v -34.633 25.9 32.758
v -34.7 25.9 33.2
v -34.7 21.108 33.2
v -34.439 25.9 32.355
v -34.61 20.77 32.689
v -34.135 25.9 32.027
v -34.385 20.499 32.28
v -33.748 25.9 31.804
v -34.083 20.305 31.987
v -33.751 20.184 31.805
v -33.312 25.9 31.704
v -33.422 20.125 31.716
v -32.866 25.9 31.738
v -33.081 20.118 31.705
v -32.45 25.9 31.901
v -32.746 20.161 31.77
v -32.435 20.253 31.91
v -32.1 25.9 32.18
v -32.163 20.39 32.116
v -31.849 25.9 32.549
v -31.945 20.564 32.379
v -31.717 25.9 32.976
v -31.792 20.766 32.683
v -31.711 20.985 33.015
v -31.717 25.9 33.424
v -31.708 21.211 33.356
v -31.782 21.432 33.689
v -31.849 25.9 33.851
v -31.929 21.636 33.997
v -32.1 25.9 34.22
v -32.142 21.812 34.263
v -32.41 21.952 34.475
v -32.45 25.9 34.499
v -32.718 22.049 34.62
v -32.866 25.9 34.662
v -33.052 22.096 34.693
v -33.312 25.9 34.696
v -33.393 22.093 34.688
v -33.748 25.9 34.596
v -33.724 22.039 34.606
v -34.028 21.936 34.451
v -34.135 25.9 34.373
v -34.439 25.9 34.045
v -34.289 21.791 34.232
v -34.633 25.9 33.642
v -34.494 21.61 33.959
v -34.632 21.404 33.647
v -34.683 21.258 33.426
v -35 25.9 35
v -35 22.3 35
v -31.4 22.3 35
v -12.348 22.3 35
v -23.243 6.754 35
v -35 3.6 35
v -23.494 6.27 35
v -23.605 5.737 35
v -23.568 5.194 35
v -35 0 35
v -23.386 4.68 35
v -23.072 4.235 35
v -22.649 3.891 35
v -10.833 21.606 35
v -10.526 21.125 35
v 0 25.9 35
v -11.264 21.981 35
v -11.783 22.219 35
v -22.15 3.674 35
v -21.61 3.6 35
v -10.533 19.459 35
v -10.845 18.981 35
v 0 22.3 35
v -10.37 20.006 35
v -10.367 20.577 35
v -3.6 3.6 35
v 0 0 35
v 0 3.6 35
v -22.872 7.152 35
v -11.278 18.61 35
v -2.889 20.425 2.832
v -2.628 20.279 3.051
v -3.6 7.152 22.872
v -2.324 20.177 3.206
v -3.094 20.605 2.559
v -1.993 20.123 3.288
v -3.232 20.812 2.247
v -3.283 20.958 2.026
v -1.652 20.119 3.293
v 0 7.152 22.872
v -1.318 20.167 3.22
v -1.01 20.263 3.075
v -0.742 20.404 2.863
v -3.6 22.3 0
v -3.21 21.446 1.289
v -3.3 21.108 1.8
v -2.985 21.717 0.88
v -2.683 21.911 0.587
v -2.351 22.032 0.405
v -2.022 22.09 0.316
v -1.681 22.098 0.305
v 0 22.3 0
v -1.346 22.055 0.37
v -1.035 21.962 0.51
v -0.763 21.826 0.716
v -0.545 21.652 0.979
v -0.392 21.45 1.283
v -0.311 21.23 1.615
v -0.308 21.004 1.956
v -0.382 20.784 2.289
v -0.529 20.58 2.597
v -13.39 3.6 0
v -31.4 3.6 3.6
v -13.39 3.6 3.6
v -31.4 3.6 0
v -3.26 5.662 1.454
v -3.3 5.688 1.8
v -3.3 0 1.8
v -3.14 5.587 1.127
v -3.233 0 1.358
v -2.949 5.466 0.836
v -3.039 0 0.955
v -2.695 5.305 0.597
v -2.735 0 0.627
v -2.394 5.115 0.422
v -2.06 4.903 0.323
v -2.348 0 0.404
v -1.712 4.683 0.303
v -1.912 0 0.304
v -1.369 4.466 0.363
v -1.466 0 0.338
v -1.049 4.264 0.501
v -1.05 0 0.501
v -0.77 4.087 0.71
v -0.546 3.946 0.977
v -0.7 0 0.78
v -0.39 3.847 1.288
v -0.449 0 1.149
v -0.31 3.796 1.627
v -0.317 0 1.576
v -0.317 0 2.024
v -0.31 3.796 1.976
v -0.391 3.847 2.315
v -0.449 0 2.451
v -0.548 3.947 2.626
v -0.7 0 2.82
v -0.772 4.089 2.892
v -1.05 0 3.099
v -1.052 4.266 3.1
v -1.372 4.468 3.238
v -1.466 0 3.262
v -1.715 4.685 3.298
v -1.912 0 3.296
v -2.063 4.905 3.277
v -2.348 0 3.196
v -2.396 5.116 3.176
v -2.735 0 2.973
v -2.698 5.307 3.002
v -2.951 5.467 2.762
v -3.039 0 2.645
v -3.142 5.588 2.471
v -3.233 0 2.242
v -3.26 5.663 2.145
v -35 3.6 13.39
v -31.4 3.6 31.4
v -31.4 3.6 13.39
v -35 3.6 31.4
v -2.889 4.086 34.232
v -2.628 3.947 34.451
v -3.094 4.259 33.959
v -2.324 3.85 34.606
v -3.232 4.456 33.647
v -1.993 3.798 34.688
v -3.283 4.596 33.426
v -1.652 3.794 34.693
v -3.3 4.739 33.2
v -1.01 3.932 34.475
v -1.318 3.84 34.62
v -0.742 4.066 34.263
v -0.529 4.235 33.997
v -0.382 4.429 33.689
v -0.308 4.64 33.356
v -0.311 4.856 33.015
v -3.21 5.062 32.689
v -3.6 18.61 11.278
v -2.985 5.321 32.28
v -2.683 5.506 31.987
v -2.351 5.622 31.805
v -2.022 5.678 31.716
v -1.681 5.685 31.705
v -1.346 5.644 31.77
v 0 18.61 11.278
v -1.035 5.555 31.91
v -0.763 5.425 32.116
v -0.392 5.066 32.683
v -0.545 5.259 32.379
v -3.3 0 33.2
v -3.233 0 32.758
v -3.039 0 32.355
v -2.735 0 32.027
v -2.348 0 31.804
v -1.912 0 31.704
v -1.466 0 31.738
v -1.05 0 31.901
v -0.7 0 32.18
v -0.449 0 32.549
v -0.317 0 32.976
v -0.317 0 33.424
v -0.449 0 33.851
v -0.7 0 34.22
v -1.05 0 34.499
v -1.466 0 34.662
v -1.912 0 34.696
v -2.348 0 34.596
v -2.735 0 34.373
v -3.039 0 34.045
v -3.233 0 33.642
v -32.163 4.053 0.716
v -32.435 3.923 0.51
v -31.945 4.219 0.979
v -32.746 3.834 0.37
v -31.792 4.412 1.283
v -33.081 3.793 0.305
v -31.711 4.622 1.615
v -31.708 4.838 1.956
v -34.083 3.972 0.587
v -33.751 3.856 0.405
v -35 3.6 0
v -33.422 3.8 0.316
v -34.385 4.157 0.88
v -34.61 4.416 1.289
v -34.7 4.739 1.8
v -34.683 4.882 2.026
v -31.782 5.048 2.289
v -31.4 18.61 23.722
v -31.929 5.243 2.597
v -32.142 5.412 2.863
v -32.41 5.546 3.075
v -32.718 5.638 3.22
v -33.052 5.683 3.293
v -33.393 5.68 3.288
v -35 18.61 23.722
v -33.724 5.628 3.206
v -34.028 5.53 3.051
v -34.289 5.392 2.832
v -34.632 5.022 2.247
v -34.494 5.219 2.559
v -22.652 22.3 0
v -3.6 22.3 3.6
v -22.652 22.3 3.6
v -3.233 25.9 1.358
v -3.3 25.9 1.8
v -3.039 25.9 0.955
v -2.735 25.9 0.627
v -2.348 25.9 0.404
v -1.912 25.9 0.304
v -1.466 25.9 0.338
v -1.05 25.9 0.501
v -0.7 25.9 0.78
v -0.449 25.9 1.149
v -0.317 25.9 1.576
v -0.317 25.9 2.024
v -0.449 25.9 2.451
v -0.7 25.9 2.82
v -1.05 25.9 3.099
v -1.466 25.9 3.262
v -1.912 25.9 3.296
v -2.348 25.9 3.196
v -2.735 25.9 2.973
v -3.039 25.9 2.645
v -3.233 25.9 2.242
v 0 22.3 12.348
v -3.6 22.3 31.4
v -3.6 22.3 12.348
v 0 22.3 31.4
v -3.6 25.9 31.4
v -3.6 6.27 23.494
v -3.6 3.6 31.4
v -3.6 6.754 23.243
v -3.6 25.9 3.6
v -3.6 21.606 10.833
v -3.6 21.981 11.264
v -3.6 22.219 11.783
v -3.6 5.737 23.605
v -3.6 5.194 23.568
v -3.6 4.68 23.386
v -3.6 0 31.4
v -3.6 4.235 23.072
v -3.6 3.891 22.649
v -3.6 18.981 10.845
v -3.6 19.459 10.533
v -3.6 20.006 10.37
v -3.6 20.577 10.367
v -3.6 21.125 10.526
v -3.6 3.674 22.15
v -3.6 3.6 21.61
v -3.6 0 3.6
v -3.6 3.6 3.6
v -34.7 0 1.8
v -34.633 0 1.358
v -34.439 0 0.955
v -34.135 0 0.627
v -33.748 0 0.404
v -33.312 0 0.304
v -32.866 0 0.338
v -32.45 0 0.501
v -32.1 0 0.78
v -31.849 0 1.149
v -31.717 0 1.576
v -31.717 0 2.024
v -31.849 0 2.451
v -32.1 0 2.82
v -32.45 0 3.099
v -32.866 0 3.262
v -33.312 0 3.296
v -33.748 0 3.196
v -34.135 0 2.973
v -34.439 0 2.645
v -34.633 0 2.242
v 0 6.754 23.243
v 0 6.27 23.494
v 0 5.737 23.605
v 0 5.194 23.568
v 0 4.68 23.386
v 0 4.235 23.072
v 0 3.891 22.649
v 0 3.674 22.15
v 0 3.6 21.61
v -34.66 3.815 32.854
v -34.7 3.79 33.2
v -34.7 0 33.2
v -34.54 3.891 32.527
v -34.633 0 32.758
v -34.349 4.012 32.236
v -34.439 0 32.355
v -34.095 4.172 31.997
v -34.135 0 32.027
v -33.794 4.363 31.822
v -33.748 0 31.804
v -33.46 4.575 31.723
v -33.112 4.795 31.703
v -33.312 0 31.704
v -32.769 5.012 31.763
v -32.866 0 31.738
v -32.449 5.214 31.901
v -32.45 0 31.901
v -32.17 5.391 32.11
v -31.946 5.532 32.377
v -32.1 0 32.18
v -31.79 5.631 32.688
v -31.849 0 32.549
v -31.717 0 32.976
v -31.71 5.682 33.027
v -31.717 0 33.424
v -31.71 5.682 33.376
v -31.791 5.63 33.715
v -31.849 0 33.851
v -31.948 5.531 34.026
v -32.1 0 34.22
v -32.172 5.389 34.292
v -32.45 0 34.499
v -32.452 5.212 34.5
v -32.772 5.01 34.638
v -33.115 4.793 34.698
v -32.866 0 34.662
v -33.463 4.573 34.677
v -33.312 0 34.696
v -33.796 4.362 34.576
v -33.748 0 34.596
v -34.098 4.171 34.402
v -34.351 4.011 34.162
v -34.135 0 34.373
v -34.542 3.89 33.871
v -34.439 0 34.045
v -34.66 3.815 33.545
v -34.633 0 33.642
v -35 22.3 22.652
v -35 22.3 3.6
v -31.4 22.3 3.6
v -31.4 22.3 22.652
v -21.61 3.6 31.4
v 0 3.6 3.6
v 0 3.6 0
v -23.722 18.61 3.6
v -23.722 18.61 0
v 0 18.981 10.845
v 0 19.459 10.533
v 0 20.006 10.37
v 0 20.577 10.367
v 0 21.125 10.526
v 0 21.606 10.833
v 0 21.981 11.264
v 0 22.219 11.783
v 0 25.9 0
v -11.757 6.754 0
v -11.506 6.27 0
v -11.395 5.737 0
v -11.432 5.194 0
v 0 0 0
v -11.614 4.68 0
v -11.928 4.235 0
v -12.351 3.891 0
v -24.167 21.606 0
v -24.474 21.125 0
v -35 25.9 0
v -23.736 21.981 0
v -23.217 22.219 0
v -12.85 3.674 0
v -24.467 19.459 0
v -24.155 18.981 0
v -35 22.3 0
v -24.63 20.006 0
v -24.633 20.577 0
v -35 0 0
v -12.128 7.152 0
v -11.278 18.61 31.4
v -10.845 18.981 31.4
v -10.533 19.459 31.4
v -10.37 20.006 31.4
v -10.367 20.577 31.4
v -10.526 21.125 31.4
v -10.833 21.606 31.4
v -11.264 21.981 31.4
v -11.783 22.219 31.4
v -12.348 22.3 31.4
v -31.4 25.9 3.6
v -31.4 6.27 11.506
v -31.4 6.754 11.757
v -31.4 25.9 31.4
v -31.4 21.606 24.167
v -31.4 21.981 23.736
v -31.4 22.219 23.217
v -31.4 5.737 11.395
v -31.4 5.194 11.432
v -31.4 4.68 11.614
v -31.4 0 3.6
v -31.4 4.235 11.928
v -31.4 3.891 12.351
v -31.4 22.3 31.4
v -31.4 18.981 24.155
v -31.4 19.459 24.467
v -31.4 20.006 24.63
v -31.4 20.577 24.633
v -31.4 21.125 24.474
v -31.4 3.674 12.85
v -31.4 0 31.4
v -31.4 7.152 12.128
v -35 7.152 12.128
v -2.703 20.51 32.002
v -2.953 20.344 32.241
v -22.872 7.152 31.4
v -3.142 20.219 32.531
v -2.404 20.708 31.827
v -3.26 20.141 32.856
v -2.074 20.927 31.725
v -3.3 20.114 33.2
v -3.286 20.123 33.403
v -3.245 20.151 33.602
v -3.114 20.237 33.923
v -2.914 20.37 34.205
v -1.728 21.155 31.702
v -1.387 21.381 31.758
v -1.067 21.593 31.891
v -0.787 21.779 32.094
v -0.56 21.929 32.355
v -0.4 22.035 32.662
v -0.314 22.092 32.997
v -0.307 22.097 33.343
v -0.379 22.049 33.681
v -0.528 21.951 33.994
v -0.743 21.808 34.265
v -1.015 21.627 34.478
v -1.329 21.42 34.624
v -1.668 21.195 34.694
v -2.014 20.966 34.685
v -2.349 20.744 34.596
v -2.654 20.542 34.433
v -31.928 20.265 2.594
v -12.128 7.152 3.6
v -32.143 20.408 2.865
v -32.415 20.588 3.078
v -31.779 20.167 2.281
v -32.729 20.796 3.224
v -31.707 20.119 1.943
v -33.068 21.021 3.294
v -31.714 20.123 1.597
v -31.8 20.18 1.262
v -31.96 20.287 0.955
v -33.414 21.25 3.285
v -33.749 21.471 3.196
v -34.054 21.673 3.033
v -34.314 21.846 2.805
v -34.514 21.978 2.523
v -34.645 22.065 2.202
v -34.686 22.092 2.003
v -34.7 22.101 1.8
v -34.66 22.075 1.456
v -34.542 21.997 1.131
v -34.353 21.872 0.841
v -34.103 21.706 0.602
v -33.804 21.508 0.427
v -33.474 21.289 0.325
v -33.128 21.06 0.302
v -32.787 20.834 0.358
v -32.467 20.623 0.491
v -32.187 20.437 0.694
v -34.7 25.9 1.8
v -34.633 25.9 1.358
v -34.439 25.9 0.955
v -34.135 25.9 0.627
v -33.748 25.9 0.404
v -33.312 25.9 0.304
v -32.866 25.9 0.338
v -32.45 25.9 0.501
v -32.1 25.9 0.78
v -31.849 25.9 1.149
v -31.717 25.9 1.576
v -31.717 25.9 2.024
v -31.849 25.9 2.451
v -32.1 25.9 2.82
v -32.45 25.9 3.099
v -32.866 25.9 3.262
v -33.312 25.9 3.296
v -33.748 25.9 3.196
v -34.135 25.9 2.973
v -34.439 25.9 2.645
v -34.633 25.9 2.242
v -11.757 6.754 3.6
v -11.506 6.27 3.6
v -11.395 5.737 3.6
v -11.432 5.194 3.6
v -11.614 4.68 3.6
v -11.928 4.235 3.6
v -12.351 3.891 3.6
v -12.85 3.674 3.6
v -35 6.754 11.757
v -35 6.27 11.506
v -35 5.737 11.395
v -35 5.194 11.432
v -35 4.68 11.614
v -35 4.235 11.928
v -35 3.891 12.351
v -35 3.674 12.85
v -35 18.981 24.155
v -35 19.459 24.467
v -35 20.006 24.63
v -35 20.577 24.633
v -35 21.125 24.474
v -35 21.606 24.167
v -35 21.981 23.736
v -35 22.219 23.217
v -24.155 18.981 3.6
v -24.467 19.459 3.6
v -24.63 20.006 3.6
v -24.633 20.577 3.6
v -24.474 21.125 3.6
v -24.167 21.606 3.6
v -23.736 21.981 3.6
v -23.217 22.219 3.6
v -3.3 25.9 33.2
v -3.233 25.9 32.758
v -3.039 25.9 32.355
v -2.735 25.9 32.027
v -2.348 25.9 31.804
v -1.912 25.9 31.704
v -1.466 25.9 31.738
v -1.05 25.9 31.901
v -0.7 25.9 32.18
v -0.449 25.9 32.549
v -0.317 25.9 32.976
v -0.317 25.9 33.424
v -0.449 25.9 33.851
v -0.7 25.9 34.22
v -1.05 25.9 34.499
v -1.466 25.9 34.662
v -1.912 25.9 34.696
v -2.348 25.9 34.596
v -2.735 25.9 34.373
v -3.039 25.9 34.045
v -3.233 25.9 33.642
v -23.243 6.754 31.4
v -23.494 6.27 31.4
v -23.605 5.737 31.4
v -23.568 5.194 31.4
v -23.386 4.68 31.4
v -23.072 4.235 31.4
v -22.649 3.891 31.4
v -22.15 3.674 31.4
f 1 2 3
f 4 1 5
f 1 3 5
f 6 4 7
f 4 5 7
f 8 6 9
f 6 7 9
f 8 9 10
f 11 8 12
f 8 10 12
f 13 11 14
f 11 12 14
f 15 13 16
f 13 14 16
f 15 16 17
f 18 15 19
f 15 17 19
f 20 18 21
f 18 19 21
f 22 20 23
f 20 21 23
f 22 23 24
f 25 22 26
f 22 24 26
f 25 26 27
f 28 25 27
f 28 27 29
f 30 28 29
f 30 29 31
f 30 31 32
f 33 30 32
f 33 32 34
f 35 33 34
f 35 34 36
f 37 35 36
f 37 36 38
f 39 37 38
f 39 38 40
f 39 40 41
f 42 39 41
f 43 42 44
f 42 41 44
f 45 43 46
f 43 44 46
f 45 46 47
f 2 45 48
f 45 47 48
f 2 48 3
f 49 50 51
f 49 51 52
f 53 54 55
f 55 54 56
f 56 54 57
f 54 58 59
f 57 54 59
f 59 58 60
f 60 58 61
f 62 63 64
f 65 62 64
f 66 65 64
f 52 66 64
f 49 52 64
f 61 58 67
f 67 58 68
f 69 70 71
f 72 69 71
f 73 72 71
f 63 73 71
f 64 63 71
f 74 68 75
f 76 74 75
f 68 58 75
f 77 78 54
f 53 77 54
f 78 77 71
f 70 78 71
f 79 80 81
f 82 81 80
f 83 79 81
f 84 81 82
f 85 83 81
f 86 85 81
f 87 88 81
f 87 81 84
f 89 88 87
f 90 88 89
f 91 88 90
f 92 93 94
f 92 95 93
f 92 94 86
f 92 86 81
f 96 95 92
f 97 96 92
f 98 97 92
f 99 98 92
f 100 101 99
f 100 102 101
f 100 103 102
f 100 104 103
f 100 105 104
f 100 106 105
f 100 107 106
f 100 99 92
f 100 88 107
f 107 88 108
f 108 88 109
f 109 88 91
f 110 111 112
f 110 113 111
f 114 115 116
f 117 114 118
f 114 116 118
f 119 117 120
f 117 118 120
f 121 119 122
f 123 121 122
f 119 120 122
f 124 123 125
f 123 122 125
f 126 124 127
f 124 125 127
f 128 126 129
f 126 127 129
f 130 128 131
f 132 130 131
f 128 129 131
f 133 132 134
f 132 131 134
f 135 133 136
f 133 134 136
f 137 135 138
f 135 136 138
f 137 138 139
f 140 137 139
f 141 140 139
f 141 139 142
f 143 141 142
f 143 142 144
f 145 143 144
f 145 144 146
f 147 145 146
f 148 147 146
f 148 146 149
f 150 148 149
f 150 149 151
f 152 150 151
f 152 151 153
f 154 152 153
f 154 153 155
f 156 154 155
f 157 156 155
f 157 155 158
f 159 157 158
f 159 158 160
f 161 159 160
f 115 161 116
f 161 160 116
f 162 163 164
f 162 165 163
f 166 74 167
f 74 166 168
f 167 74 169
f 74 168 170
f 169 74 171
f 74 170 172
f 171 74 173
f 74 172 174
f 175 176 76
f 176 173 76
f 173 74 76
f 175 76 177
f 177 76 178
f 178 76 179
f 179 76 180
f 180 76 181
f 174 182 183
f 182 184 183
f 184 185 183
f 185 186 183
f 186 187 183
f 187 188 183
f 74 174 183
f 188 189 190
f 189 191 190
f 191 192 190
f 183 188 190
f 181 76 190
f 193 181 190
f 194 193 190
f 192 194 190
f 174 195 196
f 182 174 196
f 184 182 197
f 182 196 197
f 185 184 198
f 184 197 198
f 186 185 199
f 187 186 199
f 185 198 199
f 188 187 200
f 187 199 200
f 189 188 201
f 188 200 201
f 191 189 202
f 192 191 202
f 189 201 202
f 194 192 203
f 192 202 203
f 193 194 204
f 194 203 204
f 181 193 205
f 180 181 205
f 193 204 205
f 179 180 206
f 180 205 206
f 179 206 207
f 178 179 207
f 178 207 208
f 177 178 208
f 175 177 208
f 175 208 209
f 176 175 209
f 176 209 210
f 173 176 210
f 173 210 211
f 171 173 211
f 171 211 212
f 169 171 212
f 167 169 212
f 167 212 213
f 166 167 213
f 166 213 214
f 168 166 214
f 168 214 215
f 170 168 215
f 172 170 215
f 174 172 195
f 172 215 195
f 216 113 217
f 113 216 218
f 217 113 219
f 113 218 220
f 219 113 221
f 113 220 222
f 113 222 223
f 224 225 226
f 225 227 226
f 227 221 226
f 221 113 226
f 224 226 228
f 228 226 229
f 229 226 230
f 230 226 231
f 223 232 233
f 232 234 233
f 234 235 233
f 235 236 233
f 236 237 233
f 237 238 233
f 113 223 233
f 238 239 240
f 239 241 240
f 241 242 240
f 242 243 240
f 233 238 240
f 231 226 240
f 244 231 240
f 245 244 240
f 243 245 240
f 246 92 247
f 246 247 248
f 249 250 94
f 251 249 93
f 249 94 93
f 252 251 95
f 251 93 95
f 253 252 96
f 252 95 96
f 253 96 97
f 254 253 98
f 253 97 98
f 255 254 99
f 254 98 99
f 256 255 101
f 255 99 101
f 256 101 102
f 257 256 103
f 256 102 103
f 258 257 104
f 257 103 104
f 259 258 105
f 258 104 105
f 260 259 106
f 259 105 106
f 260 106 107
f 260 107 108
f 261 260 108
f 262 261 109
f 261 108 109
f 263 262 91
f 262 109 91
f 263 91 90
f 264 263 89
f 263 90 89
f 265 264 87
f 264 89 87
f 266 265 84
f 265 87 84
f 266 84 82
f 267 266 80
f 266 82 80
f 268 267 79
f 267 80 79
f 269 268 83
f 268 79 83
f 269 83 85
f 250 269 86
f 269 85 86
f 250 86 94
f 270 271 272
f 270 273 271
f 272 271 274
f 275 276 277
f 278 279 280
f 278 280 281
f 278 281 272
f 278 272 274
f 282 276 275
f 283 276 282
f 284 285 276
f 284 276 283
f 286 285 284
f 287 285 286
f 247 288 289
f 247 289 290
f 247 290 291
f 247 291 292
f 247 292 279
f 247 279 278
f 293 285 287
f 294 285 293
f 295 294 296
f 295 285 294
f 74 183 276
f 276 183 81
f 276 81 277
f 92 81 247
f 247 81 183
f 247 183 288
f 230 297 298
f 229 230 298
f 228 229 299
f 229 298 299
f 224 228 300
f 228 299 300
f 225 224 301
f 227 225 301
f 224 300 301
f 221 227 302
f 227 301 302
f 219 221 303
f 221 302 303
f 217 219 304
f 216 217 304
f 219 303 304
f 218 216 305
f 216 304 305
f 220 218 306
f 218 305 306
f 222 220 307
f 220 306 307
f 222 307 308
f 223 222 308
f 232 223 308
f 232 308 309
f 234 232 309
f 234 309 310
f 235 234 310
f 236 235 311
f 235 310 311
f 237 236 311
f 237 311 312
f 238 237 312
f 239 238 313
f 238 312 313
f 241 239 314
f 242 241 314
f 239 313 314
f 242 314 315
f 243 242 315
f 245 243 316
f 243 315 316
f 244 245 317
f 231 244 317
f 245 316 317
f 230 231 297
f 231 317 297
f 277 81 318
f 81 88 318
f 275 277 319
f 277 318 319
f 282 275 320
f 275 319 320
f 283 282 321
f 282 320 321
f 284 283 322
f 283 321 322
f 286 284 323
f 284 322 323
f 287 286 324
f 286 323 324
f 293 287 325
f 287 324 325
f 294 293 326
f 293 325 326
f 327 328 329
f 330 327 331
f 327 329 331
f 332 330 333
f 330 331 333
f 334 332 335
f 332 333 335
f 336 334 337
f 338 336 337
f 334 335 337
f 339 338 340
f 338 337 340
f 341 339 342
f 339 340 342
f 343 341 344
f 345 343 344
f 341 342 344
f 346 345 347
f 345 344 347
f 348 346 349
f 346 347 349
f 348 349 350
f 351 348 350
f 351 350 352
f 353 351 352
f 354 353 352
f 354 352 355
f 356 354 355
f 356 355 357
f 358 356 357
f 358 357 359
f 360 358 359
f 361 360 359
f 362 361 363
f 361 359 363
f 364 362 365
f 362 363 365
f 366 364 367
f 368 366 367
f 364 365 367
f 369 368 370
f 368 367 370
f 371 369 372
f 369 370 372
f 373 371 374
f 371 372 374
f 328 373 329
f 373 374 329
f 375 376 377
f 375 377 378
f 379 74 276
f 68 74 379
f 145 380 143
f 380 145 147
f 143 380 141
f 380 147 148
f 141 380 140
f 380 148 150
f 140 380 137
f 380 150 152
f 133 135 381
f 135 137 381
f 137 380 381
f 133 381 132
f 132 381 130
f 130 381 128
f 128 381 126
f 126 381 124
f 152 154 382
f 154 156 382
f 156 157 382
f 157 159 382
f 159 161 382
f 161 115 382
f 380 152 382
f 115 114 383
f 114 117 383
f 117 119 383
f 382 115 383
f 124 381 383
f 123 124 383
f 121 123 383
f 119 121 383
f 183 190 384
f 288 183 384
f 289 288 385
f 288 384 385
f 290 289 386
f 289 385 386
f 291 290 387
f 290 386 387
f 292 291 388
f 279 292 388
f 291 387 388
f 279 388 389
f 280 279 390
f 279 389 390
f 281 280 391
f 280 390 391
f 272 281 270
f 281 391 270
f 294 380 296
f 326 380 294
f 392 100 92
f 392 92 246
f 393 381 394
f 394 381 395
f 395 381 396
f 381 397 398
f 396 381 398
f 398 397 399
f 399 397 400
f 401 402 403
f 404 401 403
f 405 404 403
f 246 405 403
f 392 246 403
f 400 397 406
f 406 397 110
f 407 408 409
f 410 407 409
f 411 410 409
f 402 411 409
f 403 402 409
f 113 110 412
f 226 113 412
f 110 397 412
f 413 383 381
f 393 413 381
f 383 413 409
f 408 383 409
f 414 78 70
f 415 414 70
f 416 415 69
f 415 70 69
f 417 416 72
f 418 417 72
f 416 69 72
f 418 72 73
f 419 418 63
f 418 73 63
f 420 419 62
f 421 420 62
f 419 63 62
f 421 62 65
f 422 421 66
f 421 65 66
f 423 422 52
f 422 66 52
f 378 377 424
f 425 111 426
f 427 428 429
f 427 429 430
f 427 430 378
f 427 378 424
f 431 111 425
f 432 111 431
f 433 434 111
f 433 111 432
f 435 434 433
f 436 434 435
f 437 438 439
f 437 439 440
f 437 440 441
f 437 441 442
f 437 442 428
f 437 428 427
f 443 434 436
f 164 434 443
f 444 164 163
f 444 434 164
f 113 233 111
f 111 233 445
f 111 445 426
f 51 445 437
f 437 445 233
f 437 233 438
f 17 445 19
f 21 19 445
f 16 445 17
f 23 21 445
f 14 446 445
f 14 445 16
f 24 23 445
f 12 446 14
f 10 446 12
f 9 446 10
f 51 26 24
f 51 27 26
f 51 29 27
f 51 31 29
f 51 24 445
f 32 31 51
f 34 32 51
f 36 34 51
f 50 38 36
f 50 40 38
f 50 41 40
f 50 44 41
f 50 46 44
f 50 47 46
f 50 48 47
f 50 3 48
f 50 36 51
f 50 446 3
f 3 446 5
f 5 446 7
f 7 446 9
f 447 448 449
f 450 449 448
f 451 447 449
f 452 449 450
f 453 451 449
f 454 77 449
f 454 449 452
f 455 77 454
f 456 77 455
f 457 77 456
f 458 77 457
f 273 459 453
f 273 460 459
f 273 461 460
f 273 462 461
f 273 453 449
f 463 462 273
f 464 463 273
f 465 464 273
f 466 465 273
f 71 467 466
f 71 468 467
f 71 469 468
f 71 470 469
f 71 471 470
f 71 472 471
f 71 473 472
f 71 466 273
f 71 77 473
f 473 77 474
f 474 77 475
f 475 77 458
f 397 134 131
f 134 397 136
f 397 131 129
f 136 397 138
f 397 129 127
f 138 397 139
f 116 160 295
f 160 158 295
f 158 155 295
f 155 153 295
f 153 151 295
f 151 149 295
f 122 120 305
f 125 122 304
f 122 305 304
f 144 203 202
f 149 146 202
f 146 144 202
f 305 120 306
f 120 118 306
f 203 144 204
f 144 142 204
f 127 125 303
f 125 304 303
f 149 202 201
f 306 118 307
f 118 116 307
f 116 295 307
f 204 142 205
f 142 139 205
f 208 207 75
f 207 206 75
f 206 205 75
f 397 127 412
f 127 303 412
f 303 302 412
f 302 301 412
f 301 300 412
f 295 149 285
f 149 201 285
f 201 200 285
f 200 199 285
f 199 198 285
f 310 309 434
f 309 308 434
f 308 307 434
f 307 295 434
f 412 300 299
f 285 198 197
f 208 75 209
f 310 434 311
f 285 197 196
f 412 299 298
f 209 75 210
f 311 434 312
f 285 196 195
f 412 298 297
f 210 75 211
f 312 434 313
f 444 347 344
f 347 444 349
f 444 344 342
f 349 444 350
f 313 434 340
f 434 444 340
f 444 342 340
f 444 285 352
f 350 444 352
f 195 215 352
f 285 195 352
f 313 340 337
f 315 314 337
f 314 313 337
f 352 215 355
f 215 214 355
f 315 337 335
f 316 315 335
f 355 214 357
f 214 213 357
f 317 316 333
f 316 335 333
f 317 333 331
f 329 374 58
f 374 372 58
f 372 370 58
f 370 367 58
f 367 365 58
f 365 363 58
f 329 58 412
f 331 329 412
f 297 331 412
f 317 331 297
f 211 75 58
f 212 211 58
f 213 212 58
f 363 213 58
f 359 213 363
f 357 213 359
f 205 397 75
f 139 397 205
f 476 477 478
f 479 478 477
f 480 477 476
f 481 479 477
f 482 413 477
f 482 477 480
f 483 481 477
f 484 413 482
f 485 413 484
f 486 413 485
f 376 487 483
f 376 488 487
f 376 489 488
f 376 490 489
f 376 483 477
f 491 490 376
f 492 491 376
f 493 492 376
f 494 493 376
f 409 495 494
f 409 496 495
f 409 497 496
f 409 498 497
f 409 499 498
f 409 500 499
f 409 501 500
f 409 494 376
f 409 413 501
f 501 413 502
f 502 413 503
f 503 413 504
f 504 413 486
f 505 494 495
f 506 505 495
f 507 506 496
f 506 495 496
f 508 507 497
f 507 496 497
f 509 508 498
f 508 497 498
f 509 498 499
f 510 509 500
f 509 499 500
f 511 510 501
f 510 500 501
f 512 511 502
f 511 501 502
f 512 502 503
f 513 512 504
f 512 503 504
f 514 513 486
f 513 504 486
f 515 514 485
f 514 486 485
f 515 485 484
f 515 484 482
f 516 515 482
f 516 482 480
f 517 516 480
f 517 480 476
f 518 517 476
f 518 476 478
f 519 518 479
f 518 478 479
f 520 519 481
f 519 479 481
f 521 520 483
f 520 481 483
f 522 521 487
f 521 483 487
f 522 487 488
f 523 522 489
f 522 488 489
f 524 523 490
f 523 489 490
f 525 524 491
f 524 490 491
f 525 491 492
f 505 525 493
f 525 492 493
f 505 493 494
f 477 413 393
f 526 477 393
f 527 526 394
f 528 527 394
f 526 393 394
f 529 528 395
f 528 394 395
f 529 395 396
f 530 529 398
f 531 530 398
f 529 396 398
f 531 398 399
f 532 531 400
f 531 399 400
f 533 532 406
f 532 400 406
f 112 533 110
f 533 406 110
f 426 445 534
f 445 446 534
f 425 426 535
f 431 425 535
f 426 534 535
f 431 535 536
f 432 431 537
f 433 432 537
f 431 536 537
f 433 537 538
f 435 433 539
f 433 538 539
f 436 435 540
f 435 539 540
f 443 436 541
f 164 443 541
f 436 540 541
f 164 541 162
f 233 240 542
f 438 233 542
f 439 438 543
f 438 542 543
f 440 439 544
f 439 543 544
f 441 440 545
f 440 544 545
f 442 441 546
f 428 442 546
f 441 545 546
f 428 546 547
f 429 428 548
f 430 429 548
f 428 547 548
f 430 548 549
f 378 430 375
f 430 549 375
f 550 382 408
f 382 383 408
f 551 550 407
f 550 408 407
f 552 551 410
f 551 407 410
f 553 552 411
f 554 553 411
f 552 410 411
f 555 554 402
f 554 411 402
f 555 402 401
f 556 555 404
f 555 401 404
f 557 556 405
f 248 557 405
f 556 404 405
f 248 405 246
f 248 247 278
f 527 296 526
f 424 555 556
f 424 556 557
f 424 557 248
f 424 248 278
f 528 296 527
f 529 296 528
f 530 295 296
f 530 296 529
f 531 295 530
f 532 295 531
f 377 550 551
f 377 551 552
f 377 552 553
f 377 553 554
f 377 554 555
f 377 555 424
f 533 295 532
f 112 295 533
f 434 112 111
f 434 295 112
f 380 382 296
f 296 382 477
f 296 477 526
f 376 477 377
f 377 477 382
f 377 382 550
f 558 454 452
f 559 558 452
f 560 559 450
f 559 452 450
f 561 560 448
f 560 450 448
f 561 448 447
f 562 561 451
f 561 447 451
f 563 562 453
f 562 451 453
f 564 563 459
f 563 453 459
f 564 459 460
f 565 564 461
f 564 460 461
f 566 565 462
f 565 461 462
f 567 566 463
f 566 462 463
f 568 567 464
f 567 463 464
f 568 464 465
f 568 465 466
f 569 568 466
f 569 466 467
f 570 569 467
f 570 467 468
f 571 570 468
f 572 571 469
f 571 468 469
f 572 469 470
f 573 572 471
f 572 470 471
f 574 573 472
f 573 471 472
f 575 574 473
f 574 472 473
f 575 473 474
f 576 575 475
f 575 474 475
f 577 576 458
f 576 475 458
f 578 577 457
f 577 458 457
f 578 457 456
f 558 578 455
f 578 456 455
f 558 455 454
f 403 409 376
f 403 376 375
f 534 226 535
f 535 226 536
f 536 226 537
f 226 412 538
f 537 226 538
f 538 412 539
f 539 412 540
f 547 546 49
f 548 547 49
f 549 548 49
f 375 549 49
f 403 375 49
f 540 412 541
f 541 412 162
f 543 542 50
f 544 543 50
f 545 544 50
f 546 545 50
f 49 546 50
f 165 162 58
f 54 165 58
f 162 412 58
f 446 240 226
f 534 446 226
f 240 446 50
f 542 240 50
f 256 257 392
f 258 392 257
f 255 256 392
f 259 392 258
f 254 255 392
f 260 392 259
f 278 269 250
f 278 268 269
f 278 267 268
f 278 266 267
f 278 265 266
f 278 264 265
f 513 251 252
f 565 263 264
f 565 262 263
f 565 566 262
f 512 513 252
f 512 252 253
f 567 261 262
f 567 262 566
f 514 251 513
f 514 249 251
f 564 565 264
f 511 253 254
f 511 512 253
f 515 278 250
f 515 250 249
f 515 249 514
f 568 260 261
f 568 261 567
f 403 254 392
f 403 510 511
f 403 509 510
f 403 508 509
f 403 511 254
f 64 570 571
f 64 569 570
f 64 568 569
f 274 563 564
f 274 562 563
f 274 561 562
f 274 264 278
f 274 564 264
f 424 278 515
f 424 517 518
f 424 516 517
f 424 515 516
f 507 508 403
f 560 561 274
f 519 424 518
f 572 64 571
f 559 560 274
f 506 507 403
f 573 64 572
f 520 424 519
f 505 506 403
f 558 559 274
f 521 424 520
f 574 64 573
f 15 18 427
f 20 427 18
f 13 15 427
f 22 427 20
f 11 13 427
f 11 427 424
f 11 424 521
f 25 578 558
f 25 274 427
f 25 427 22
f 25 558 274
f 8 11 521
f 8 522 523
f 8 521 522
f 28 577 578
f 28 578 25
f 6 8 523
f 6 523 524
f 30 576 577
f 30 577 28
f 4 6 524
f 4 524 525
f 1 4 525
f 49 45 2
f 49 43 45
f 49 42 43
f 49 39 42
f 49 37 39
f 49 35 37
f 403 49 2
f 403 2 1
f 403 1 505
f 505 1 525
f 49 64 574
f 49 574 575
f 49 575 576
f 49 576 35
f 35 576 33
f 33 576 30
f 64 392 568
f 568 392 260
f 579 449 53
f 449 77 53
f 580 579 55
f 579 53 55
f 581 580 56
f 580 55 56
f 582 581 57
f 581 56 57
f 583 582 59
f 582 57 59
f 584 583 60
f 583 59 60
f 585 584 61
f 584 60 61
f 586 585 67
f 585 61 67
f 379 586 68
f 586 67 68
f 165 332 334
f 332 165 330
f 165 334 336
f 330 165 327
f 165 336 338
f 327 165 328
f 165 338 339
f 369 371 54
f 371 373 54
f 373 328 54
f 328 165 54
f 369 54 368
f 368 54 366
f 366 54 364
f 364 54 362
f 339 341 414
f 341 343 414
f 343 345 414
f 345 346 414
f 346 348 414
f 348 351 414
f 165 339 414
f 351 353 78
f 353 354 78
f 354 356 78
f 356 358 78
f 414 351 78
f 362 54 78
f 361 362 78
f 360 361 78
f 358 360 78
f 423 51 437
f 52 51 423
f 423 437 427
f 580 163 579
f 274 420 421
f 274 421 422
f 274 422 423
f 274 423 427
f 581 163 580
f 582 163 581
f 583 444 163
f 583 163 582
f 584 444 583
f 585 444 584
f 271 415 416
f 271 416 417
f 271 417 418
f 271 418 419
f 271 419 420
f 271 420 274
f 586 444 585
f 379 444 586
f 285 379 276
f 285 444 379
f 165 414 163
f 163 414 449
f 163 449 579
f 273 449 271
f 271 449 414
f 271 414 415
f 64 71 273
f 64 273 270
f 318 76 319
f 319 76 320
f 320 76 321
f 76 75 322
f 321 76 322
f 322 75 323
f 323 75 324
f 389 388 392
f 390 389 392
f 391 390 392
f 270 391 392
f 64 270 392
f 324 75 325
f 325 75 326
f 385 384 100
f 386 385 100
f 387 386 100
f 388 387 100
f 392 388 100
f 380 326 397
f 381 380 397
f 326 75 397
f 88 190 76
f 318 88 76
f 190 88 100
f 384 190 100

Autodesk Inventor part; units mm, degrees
ref_plane "YZ Plane" through (0, 0, 0) normal (1, 0, 0) x (0, 1, 0)
ref_plane "XZ Plane" through (0, 0, 0) normal (0, 1, 0) x (-1, 0, 0)
ref_plane "XY Plane" through (0, 0, 0) normal (0, 0, 1) x (1, 0, 0)
sketch "Sketch1" plane through (0, 0, 0) normal (0, 1, 0) x (-1, 0, 0)
  line L0 (0, 0) -> (35, 0)
  line L1 (35, 0) -> (35, 35)
  line L2 (35, 35) -> (0, 35)
  line L3 (0, 35) -> (0, 0)
  line L4 (3.6, 3.6) -> (31.4, 3.6)
  line L5 (31.4, 3.6) -> (31.4, 31.4)
  line L6 (31.4, 31.4) -> (3.6, 31.4)
  line L7 (3.6, 31.4) -> (3.6, 3.6)
  circle A0 centre (33.2, 33.2) radius 1.5
  circle A1 centre (33.2, 1.8) radius 1.5
  circle A2 centre (1.8, 1.8) radius 1.5
  circle A3 centre (1.8, 33.2) radius 1.5
  dimension "d0" = 35
  dimension "d1" = 35
  dimension "d2" = 3.6
  dimension "d3" = 3.6
  dimension "d4" = 3.6
  dimension "d5" = 3.6
  dimension "d6" = 3
  dimension "d7" = 1.8
  dimension "d8" = 1.8
  dimension "d9" = 3
  dimension "d10" = 1.8
  dimension "d11" = 1.8
  dimension "d12" = 3
  dimension "d13" = 1.8
  dimension "d14" = 1.8
  dimension "d15" = 3
  dimension "d16" = 1.8
  dimension "d17" = 1.8
extrude "Extrusion1" add sketch "Sketch1" along normal blind 25.9
sketch "Sketch3" plane through (-35, 0, 35) normal (0, 0, 1) x (1, 0, 0)
  line L0 (0, 25.9) -> (35, 25.9) projected
  line L1 (0, 0) -> (35, 0) projected
  line L2 (0, 0) -> (0, 25.9) projected
  line L3 (18.01, 21.1181) -> (18.01, 21.1181)
  line L4 (0, 0) -> (0, 25.9) projected
  line L5 (31.4, 0) -> (31.4, 25.9) projected
  line L6 (31.4, 3.6) -> (13.39, 3.6)
  arc A0 (12.1285, 7.1519) -> (13.39, 3.6) centre (13.39, 5.6) ccw
  line L7 (3.6, 22.3) -> (22.6522, 22.3)
  line L8 (3.6, 22.3) -> (0, 22.3)
  line L9 (31.4, 3.6) -> (31.4, 0)
  line L10 (0, 22.3) -> (0, 25.9)
  line L11 (31.4, 22.2467) -> (31.4, 25.9)
  line L12 (0, 3.6) -> (0, 0)
  line L13 (35, 0) -> (35, 25.9) projected
  line L14 (31.4, 20.2467) -> (31.4, 25.9)
  line L15 (0, 25.9) -> (0, 22.3)
  line L16 (12.1285, 7.1519) -> (35, 22.3)
  arc A1 (23.7216, 18.6099) -> (22.6522, 22.3) centre (22.6522, 20.3) ccw
  line L17 (0, 3.6) -> (23.7216, 18.6099)
  line L18 (3.6, 22.3) -> (3.6, 5.8779)
  line L19 (3.6, 0) -> (3.6, 25.9) projected
  line L20 (35, 12.95) -> (31.4, 12.95)
  line L21 (3.6, 5.8779) -> (3.6, 12.95)
  line L22 (0, 12.95) -> (0, 3.6)
  line L23 (0, 12.95) -> (3.6, 12.95)
  point P0 (31.4, 19.9157)
  point P1 (0, 22.3)
  dimension "d41" = 18.01
  dimension "d42" = 4
  dimension "d50" = 3.6
  dimension "d67" = 3.6
  dimension "d70" = 3.6
  dimension "d71" = 4
extrude "Extrusion2" cut sketch "Sketch3" against normal blind 3.6 contours L7 A1 L17 L18 | L23 L18 L17 L2 | L13 L20 L5 L16 | L5 L6 A0 L16
sketch "Sketch8" plane through (0, 0, 0) normal (0, 0, -1) x (-1, 0, 0)
  line L0 (0, 25.9) -> (35, 25.9)
  line L1 (0, 0) -> (35, 0)
  line L2 (0, 0) -> (0, 25.9)
  line L3 (18.01, 21.1181) -> (18.01, 21.1181)
  line L4 (0, 0) -> (0, 25.9)
  line L5 (31.4, 0) -> (31.4, 25.9)
  line L6 (31.4, 3.6) -> (13.39, 3.6)
  arc A0 (12.1285, 7.1519) -> (13.39, 3.6) centre (13.39, 5.6) ccw
  line L7 (3.6, 22.3) -> (22.6522, 22.3)
  line L8 (3.6, 22.3) -> (0, 22.3)
  line L9 (31.4, 3.6) -> (31.4, 0)
  line L10 (0, 22.3) -> (0, 25.9)
  line L11 (31.4, 22.2467) -> (31.4, 25.9)
  line L12 (0, 3.6) -> (0, 0)
  line L13 (35, 0) -> (35, 25.9)
  line L14 (31.4, 20.2467) -> (31.4, 25.9)
  line L15 (0, 25.9) -> (0, 22.3)
  line L16 (12.1285, 7.1519) -> (35, 22.3)
  arc A1 (23.7216, 18.6099) -> (22.6522, 22.3) centre (22.6522, 20.3) ccw
  line L17 (0, 3.6) -> (23.7216, 18.6099)
  line L18 (3.6, 22.3) -> (3.6, 5.8779)
  line L19 (3.6, 0) -> (3.6, 25.9)
  line L20 (35, 12.95) -> (31.4, 12.95)
  line L21 (3.6, 5.8779) -> (3.6, 12.95)
  line L22 (0, 12.95) -> (0, 3.6)
  line L23 (0, 12.95) -> (3.6, 12.95)
  point P0 (31.4, 19.9157)
  point P1 (0, 22.3)
  dimension "d80" = 18.01
  dimension "d78" = 4
  dimension "d76" = 3.6
  dimension "d79" = 3.6
  dimension "d77" = 3.6
  dimension "d75" = 4
extrude "Extrusion4" cut sketch "Sketch8" against normal blind 3.6 contours L7 A1 L17 L18 | L23 L18 L17 L2 | L13 L20 L5 L16 | L5 L6 A0 L16
sketch "Sketch9" plane through (0, 0, 35) normal (1, 0, 0) x (0, 0, -1)
  line L0 (0, 25.9) -> (35, 25.9)
  line L1 (0, 0) -> (35, 0)
  line L2 (0, 0) -> (0, 25.9)
  line L3 (18.01, 21.1181) -> (18.01, 21.1181)
  line L4 (0, 0) -> (0, 25.9)
  line L5 (31.4, 0) -> (31.4, 25.9)
  line L6 (31.4, 3.6) -> (13.39, 3.6)
  arc A0 (12.1285, 7.1519) -> (13.39, 3.6) centre (13.39, 5.6) ccw
  line L7 (3.6, 22.3) -> (22.6522, 22.3)
  line L8 (3.6, 22.3) -> (0, 22.3)
  line L9 (31.4, 3.6) -> (31.4, 0)
  line L10 (0, 22.3) -> (0, 25.9)
  line L11 (31.4, 22.2467) -> (31.4, 25.9)
  line L12 (0, 3.6) -> (0, 0)
  line L13 (35, 0) -> (35, 25.9)
  line L14 (31.4, 20.2467) -> (31.4, 25.9)
  line L15 (0, 25.9) -> (0, 22.3)
  line L16 (12.1285, 7.1519) -> (35, 22.3)
  arc A1 (23.7216, 18.6099) -> (22.6522, 22.3) centre (22.6522, 20.3) ccw
  line L17 (0, 3.6) -> (23.7216, 18.6099)
  line L18 (3.6, 22.3) -> (3.6, 5.8779)
  line L19 (3.6, 0) -> (3.6, 25.9)
  line L20 (35, 12.95) -> (31.4, 12.95)
  line L21 (3.6, 5.8779) -> (3.6, 12.95)
  line L22 (0, 12.95) -> (0, 3.6)
  line L23 (0, 12.95) -> (3.6, 12.95)
  point P0 (31.4, 19.9157)
  point P1 (0, 22.3)
  dimension "d89" = 18.01
  dimension "d87" = 4
  dimension "d85" = 3.6
  dimension "d88" = 3.6
  dimension "d86" = 3.6
  dimension "d84" = 4
extrude "Extrusion5" cut sketch "Sketch9" against normal blind 3.6 contours L7 A1 L17 L18 | L23 L18 L17 L2 | L13 L20 L5 L16 | L5 L6 A0 L16
sketch "Sketch10" plane through (-35, 0, 0) normal (-1, 0, 0) x (0, 0, 1)
  line L0 (0, 25.9) -> (35, 25.9)
  line L1 (0, 0) -> (35, 0)
  line L2 (0, 0) -> (0, 25.9)
  line L3 (18.01, 21.1181) -> (18.01, 21.1181)
  line L4 (0, 0) -> (0, 25.9)
  line L5 (31.4, 0) -> (31.4, 25.9)
  line L6 (31.4, 3.6) -> (13.39, 3.6)
  arc A0 (12.1285, 7.1519) -> (13.39, 3.6) centre (13.39, 5.6) ccw
  line L7 (3.6, 22.3) -> (22.6522, 22.3)
  line L8 (3.6, 22.3) -> (0, 22.3)
  line L9 (31.4, 3.6) -> (31.4, 0)
  line L10 (0, 22.3) -> (0, 25.9)
  line L11 (31.4, 22.2467) -> (31.4, 25.9)
  line L12 (0, 3.6) -> (0, 0)
  line L13 (35, 0) -> (35, 25.9)
  line L14 (31.4, 20.2467) -> (31.4, 25.9)
  line L15 (0, 25.9) -> (0, 22.3)
  line L16 (12.1285, 7.1519) -> (35, 22.3)
  arc A1 (23.7216, 18.6099) -> (22.6522, 22.3) centre (22.6522, 20.3) ccw
  line L17 (0, 3.6) -> (23.7216, 18.6099)
  line L18 (3.6, 22.3) -> (3.6, 5.8779)
  line L19 (3.6, 0) -> (3.6, 25.9)
  line L20 (35, 12.95) -> (31.4, 12.95)
  line L21 (3.6, 5.8779) -> (3.6, 12.95)
  line L22 (0, 12.95) -> (0, 3.6)
  line L23 (0, 12.95) -> (3.6, 12.95)
  point P0 (31.4, 19.9157)
  point P1 (0, 22.3)
  dimension "d98" = 18.01
  dimension "d96" = 4
  dimension "d94" = 3.6
  dimension "d97" = 3.6
  dimension "d95" = 3.6
  dimension "d93" = 4
extrude "Extrusion6" cut sketch "Sketch10" against normal blind 3.6 contours L7 A1 L17 L18 | L23 L18 L17 L2 | L13 L20 L5 L16 | L5 L6 A0 L16
properties part number "SolarCar" material "Aluminum 6061"
